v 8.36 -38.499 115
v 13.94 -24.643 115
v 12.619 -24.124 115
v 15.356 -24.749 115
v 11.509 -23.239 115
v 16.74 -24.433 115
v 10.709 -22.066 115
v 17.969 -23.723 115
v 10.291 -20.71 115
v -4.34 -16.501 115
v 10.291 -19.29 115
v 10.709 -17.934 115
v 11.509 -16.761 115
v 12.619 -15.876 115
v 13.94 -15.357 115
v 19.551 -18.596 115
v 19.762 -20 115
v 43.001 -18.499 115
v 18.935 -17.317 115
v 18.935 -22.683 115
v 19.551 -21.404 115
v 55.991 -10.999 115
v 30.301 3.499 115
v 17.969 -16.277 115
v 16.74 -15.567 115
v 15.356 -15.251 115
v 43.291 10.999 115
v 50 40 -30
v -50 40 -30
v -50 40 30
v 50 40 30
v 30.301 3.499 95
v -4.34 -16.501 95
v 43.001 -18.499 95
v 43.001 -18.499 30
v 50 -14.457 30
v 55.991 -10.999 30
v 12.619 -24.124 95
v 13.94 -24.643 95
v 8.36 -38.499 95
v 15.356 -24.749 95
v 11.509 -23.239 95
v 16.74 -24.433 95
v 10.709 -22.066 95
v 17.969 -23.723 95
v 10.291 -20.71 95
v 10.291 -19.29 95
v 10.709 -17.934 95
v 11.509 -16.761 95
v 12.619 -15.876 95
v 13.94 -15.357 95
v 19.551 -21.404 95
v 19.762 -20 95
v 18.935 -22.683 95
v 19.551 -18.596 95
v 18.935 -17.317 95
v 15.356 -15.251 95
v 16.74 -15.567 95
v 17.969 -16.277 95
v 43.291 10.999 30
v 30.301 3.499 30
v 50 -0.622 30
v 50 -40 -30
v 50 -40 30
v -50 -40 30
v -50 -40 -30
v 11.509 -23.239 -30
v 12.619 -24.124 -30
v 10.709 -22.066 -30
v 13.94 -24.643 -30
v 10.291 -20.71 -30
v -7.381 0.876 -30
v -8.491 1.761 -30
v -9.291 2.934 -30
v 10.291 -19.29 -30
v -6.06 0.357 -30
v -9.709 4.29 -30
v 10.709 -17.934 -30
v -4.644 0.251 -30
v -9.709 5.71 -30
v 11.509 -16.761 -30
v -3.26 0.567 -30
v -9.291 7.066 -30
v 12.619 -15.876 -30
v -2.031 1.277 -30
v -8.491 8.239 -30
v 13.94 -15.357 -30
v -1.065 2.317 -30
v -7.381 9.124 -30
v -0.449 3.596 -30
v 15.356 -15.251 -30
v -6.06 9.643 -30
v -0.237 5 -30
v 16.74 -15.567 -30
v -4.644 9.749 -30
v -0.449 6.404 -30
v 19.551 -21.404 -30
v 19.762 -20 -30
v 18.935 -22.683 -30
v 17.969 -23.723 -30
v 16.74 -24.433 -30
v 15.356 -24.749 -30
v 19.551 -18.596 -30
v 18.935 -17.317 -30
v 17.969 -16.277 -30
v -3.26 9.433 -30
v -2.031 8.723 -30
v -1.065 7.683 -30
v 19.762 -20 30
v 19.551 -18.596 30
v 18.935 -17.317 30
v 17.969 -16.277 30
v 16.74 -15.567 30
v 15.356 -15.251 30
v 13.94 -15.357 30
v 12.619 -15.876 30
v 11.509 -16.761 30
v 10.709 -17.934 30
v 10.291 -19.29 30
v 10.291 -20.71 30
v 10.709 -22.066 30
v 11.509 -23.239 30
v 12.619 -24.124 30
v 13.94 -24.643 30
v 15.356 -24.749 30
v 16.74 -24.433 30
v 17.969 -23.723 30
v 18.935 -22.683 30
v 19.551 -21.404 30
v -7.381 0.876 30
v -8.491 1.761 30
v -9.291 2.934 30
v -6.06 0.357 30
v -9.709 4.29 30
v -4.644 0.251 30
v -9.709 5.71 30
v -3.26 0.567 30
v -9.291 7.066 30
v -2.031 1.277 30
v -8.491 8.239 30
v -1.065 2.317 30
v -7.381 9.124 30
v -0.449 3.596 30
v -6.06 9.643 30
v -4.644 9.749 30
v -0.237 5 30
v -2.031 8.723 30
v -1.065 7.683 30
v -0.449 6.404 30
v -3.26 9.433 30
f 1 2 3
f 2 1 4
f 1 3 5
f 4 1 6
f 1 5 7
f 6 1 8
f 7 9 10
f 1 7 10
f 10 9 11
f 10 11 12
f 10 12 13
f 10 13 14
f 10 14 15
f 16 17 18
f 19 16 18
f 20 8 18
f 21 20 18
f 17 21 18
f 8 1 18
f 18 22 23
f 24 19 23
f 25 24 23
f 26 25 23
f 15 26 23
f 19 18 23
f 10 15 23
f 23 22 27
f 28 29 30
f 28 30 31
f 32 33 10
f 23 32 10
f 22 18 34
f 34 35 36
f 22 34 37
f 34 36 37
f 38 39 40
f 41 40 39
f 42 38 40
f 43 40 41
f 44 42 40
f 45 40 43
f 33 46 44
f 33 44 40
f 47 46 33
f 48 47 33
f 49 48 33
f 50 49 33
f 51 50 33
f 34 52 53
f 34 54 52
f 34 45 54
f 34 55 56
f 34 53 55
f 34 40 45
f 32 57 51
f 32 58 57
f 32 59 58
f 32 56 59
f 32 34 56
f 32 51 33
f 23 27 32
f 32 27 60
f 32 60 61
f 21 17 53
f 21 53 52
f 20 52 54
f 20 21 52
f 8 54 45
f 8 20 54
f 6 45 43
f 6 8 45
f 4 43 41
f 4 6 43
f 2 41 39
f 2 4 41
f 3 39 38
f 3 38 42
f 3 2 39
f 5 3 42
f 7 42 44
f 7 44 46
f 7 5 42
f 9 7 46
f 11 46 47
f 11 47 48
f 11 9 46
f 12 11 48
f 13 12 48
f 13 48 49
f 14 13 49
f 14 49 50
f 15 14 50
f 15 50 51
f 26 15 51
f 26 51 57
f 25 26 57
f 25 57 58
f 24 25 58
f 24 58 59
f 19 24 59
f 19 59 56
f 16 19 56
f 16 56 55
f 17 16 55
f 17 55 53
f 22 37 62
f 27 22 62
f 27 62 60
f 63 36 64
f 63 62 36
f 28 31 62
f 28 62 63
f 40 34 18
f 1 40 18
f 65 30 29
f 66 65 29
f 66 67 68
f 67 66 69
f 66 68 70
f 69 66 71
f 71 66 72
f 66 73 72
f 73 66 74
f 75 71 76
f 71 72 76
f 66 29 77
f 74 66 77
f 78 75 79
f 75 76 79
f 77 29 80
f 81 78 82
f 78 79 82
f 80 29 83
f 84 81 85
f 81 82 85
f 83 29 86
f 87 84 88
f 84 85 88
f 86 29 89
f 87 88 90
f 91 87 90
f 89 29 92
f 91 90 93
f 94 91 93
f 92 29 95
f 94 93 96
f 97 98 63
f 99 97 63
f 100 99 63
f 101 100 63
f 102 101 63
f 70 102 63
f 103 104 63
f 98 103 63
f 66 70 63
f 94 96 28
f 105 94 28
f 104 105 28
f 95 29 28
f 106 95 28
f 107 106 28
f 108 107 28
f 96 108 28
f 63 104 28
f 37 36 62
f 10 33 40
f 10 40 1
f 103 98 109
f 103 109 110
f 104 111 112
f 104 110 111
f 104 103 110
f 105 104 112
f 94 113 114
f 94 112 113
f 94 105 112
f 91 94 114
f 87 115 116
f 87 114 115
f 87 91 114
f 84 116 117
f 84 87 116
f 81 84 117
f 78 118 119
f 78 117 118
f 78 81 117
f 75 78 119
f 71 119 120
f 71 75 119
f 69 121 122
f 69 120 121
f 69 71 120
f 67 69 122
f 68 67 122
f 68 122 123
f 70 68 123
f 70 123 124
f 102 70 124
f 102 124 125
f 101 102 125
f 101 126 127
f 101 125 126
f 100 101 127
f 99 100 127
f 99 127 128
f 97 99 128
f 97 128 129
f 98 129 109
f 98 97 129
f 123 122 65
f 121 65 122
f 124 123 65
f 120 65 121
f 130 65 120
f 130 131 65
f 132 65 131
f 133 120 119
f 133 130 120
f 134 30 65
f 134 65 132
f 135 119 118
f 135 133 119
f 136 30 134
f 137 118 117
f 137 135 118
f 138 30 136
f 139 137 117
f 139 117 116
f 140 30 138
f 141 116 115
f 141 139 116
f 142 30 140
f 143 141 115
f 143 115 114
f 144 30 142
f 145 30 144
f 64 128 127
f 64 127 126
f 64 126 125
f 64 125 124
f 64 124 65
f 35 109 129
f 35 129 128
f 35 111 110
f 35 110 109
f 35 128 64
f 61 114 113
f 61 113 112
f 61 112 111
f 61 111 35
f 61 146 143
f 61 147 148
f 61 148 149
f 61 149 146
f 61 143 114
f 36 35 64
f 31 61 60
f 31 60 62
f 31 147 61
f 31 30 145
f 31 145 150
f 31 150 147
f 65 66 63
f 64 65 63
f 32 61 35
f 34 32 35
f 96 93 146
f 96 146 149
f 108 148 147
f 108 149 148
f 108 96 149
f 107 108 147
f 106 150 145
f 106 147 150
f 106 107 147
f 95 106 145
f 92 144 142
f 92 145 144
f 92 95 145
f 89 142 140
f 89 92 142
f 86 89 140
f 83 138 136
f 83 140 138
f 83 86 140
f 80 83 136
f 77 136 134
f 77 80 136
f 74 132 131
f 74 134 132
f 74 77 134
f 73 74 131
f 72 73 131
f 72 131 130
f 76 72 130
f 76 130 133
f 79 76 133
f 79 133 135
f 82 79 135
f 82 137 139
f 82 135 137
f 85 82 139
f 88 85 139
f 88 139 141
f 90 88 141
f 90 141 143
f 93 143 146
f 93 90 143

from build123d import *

# Parameters (mm, degrees)
SKETCH1_W               = 100
SKETCH1_H               = 60
BOSS_EXTRUDE1_DEPTH     = 40
BOSS_EXTRUDE2_DEPTH     = 85
CUT_EXTRUDE1_DEPTH      = 110.36175698
CUT_EXTRUDE1_DEPTH_BACK = 110.36175698
SKETCH3_R               = 4.7625
SKETCH5_W               = 20
SKETCH5_H               = 25.4
BOSS_EXTRUDE3_DEPTH     = 40
CUT_EXTRUDE2_DEPTH      = 110.36175698
CUT_EXTRUDE2_DEPTH_BACK = 110.36175698
SKETCH4_R               = 4.7625
CUT_EXTRUDE3_START      = -40
SKETCH6_R               = 4.7625
CUT_EXTRUDE3_DEPTH      = 40


with BuildPart() as part:
    # Sketch1 → Boss-Extrude1 (new, symmetric)
    with BuildSketch(Plane(origin=(0, 0, 0), x_dir=(1, 0, 0), z_dir=(0, 1, 0))):
        Rectangle(SKETCH1_W, SKETCH1_H)
    extrude(amount=BOSS_EXTRUDE1_DEPTH, both=True)

    # Sketch2 → Boss-Extrude2 (add)
    with BuildSketch(Plane.XY.offset(30)):
        Polygon((43.291016151, 10.998522628), (30.300635095, 3.498522628), (43.000635095, -18.498522628), (55.991016151, -10.998522628), align=None)
    extrude(amount=BOSS_EXTRUDE2_DEPTH)

    # Sketch3 → Cut-Extrude1 (cut, two sides: drawn at the far end of the back side and taken through both)
    with BuildSketch(Plane.XY.offset(30).offset(-CUT_EXTRUDE1_DEPTH_BACK)):
        with Locations((15, -20)):
            Circle(SKETCH3_R)
    extrude(amount=CUT_EXTRUDE1_DEPTH + CUT_EXTRUDE1_DEPTH_BACK, mode=Mode.SUBTRACT)

    # Sketch5 → Boss-Extrude3 (add)
    with BuildSketch(Plane(origin=(24.240381057, 13.995190528, 0), x_dir=(0, 0, 1), z_dir=(-0.866025403784436, -0.5000000000000046, 0))):
        with Locations((105, -24.820508076)):
            Rectangle(SKETCH5_W, SKETCH5_H)
    extrude(amount=BOSS_EXTRUDE3_DEPTH)

    # Sketch4 → Cut-Extrude2 (cut, two sides: drawn at the far end of the back side and taken through both)
    with BuildSketch(Plane.XY.offset(30).offset(-CUT_EXTRUDE2_DEPTH_BACK)):
        with Locations((-5, 5)):
            Circle(SKETCH4_R)
    extrude(amount=CUT_EXTRUDE2_DEPTH + CUT_EXTRUDE2_DEPTH_BACK, mode=Mode.SUBTRACT)

    # Sketch6 → Cut-Extrude3 (cut)
    with BuildSketch(Plane(origin=(0, 0, 95), x_dir=(-1, 0, 0), z_dir=(0, 0, -1)).offset(CUT_EXTRUDE3_START)):
        with Locations(Location((-15, -20, 0), (0, 0, 180))):
            Circle(SKETCH6_R)
    extrude(amount=CUT_EXTRUDE3_DEPTH, mode=Mode.SUBTRACT)


solid = part.part
